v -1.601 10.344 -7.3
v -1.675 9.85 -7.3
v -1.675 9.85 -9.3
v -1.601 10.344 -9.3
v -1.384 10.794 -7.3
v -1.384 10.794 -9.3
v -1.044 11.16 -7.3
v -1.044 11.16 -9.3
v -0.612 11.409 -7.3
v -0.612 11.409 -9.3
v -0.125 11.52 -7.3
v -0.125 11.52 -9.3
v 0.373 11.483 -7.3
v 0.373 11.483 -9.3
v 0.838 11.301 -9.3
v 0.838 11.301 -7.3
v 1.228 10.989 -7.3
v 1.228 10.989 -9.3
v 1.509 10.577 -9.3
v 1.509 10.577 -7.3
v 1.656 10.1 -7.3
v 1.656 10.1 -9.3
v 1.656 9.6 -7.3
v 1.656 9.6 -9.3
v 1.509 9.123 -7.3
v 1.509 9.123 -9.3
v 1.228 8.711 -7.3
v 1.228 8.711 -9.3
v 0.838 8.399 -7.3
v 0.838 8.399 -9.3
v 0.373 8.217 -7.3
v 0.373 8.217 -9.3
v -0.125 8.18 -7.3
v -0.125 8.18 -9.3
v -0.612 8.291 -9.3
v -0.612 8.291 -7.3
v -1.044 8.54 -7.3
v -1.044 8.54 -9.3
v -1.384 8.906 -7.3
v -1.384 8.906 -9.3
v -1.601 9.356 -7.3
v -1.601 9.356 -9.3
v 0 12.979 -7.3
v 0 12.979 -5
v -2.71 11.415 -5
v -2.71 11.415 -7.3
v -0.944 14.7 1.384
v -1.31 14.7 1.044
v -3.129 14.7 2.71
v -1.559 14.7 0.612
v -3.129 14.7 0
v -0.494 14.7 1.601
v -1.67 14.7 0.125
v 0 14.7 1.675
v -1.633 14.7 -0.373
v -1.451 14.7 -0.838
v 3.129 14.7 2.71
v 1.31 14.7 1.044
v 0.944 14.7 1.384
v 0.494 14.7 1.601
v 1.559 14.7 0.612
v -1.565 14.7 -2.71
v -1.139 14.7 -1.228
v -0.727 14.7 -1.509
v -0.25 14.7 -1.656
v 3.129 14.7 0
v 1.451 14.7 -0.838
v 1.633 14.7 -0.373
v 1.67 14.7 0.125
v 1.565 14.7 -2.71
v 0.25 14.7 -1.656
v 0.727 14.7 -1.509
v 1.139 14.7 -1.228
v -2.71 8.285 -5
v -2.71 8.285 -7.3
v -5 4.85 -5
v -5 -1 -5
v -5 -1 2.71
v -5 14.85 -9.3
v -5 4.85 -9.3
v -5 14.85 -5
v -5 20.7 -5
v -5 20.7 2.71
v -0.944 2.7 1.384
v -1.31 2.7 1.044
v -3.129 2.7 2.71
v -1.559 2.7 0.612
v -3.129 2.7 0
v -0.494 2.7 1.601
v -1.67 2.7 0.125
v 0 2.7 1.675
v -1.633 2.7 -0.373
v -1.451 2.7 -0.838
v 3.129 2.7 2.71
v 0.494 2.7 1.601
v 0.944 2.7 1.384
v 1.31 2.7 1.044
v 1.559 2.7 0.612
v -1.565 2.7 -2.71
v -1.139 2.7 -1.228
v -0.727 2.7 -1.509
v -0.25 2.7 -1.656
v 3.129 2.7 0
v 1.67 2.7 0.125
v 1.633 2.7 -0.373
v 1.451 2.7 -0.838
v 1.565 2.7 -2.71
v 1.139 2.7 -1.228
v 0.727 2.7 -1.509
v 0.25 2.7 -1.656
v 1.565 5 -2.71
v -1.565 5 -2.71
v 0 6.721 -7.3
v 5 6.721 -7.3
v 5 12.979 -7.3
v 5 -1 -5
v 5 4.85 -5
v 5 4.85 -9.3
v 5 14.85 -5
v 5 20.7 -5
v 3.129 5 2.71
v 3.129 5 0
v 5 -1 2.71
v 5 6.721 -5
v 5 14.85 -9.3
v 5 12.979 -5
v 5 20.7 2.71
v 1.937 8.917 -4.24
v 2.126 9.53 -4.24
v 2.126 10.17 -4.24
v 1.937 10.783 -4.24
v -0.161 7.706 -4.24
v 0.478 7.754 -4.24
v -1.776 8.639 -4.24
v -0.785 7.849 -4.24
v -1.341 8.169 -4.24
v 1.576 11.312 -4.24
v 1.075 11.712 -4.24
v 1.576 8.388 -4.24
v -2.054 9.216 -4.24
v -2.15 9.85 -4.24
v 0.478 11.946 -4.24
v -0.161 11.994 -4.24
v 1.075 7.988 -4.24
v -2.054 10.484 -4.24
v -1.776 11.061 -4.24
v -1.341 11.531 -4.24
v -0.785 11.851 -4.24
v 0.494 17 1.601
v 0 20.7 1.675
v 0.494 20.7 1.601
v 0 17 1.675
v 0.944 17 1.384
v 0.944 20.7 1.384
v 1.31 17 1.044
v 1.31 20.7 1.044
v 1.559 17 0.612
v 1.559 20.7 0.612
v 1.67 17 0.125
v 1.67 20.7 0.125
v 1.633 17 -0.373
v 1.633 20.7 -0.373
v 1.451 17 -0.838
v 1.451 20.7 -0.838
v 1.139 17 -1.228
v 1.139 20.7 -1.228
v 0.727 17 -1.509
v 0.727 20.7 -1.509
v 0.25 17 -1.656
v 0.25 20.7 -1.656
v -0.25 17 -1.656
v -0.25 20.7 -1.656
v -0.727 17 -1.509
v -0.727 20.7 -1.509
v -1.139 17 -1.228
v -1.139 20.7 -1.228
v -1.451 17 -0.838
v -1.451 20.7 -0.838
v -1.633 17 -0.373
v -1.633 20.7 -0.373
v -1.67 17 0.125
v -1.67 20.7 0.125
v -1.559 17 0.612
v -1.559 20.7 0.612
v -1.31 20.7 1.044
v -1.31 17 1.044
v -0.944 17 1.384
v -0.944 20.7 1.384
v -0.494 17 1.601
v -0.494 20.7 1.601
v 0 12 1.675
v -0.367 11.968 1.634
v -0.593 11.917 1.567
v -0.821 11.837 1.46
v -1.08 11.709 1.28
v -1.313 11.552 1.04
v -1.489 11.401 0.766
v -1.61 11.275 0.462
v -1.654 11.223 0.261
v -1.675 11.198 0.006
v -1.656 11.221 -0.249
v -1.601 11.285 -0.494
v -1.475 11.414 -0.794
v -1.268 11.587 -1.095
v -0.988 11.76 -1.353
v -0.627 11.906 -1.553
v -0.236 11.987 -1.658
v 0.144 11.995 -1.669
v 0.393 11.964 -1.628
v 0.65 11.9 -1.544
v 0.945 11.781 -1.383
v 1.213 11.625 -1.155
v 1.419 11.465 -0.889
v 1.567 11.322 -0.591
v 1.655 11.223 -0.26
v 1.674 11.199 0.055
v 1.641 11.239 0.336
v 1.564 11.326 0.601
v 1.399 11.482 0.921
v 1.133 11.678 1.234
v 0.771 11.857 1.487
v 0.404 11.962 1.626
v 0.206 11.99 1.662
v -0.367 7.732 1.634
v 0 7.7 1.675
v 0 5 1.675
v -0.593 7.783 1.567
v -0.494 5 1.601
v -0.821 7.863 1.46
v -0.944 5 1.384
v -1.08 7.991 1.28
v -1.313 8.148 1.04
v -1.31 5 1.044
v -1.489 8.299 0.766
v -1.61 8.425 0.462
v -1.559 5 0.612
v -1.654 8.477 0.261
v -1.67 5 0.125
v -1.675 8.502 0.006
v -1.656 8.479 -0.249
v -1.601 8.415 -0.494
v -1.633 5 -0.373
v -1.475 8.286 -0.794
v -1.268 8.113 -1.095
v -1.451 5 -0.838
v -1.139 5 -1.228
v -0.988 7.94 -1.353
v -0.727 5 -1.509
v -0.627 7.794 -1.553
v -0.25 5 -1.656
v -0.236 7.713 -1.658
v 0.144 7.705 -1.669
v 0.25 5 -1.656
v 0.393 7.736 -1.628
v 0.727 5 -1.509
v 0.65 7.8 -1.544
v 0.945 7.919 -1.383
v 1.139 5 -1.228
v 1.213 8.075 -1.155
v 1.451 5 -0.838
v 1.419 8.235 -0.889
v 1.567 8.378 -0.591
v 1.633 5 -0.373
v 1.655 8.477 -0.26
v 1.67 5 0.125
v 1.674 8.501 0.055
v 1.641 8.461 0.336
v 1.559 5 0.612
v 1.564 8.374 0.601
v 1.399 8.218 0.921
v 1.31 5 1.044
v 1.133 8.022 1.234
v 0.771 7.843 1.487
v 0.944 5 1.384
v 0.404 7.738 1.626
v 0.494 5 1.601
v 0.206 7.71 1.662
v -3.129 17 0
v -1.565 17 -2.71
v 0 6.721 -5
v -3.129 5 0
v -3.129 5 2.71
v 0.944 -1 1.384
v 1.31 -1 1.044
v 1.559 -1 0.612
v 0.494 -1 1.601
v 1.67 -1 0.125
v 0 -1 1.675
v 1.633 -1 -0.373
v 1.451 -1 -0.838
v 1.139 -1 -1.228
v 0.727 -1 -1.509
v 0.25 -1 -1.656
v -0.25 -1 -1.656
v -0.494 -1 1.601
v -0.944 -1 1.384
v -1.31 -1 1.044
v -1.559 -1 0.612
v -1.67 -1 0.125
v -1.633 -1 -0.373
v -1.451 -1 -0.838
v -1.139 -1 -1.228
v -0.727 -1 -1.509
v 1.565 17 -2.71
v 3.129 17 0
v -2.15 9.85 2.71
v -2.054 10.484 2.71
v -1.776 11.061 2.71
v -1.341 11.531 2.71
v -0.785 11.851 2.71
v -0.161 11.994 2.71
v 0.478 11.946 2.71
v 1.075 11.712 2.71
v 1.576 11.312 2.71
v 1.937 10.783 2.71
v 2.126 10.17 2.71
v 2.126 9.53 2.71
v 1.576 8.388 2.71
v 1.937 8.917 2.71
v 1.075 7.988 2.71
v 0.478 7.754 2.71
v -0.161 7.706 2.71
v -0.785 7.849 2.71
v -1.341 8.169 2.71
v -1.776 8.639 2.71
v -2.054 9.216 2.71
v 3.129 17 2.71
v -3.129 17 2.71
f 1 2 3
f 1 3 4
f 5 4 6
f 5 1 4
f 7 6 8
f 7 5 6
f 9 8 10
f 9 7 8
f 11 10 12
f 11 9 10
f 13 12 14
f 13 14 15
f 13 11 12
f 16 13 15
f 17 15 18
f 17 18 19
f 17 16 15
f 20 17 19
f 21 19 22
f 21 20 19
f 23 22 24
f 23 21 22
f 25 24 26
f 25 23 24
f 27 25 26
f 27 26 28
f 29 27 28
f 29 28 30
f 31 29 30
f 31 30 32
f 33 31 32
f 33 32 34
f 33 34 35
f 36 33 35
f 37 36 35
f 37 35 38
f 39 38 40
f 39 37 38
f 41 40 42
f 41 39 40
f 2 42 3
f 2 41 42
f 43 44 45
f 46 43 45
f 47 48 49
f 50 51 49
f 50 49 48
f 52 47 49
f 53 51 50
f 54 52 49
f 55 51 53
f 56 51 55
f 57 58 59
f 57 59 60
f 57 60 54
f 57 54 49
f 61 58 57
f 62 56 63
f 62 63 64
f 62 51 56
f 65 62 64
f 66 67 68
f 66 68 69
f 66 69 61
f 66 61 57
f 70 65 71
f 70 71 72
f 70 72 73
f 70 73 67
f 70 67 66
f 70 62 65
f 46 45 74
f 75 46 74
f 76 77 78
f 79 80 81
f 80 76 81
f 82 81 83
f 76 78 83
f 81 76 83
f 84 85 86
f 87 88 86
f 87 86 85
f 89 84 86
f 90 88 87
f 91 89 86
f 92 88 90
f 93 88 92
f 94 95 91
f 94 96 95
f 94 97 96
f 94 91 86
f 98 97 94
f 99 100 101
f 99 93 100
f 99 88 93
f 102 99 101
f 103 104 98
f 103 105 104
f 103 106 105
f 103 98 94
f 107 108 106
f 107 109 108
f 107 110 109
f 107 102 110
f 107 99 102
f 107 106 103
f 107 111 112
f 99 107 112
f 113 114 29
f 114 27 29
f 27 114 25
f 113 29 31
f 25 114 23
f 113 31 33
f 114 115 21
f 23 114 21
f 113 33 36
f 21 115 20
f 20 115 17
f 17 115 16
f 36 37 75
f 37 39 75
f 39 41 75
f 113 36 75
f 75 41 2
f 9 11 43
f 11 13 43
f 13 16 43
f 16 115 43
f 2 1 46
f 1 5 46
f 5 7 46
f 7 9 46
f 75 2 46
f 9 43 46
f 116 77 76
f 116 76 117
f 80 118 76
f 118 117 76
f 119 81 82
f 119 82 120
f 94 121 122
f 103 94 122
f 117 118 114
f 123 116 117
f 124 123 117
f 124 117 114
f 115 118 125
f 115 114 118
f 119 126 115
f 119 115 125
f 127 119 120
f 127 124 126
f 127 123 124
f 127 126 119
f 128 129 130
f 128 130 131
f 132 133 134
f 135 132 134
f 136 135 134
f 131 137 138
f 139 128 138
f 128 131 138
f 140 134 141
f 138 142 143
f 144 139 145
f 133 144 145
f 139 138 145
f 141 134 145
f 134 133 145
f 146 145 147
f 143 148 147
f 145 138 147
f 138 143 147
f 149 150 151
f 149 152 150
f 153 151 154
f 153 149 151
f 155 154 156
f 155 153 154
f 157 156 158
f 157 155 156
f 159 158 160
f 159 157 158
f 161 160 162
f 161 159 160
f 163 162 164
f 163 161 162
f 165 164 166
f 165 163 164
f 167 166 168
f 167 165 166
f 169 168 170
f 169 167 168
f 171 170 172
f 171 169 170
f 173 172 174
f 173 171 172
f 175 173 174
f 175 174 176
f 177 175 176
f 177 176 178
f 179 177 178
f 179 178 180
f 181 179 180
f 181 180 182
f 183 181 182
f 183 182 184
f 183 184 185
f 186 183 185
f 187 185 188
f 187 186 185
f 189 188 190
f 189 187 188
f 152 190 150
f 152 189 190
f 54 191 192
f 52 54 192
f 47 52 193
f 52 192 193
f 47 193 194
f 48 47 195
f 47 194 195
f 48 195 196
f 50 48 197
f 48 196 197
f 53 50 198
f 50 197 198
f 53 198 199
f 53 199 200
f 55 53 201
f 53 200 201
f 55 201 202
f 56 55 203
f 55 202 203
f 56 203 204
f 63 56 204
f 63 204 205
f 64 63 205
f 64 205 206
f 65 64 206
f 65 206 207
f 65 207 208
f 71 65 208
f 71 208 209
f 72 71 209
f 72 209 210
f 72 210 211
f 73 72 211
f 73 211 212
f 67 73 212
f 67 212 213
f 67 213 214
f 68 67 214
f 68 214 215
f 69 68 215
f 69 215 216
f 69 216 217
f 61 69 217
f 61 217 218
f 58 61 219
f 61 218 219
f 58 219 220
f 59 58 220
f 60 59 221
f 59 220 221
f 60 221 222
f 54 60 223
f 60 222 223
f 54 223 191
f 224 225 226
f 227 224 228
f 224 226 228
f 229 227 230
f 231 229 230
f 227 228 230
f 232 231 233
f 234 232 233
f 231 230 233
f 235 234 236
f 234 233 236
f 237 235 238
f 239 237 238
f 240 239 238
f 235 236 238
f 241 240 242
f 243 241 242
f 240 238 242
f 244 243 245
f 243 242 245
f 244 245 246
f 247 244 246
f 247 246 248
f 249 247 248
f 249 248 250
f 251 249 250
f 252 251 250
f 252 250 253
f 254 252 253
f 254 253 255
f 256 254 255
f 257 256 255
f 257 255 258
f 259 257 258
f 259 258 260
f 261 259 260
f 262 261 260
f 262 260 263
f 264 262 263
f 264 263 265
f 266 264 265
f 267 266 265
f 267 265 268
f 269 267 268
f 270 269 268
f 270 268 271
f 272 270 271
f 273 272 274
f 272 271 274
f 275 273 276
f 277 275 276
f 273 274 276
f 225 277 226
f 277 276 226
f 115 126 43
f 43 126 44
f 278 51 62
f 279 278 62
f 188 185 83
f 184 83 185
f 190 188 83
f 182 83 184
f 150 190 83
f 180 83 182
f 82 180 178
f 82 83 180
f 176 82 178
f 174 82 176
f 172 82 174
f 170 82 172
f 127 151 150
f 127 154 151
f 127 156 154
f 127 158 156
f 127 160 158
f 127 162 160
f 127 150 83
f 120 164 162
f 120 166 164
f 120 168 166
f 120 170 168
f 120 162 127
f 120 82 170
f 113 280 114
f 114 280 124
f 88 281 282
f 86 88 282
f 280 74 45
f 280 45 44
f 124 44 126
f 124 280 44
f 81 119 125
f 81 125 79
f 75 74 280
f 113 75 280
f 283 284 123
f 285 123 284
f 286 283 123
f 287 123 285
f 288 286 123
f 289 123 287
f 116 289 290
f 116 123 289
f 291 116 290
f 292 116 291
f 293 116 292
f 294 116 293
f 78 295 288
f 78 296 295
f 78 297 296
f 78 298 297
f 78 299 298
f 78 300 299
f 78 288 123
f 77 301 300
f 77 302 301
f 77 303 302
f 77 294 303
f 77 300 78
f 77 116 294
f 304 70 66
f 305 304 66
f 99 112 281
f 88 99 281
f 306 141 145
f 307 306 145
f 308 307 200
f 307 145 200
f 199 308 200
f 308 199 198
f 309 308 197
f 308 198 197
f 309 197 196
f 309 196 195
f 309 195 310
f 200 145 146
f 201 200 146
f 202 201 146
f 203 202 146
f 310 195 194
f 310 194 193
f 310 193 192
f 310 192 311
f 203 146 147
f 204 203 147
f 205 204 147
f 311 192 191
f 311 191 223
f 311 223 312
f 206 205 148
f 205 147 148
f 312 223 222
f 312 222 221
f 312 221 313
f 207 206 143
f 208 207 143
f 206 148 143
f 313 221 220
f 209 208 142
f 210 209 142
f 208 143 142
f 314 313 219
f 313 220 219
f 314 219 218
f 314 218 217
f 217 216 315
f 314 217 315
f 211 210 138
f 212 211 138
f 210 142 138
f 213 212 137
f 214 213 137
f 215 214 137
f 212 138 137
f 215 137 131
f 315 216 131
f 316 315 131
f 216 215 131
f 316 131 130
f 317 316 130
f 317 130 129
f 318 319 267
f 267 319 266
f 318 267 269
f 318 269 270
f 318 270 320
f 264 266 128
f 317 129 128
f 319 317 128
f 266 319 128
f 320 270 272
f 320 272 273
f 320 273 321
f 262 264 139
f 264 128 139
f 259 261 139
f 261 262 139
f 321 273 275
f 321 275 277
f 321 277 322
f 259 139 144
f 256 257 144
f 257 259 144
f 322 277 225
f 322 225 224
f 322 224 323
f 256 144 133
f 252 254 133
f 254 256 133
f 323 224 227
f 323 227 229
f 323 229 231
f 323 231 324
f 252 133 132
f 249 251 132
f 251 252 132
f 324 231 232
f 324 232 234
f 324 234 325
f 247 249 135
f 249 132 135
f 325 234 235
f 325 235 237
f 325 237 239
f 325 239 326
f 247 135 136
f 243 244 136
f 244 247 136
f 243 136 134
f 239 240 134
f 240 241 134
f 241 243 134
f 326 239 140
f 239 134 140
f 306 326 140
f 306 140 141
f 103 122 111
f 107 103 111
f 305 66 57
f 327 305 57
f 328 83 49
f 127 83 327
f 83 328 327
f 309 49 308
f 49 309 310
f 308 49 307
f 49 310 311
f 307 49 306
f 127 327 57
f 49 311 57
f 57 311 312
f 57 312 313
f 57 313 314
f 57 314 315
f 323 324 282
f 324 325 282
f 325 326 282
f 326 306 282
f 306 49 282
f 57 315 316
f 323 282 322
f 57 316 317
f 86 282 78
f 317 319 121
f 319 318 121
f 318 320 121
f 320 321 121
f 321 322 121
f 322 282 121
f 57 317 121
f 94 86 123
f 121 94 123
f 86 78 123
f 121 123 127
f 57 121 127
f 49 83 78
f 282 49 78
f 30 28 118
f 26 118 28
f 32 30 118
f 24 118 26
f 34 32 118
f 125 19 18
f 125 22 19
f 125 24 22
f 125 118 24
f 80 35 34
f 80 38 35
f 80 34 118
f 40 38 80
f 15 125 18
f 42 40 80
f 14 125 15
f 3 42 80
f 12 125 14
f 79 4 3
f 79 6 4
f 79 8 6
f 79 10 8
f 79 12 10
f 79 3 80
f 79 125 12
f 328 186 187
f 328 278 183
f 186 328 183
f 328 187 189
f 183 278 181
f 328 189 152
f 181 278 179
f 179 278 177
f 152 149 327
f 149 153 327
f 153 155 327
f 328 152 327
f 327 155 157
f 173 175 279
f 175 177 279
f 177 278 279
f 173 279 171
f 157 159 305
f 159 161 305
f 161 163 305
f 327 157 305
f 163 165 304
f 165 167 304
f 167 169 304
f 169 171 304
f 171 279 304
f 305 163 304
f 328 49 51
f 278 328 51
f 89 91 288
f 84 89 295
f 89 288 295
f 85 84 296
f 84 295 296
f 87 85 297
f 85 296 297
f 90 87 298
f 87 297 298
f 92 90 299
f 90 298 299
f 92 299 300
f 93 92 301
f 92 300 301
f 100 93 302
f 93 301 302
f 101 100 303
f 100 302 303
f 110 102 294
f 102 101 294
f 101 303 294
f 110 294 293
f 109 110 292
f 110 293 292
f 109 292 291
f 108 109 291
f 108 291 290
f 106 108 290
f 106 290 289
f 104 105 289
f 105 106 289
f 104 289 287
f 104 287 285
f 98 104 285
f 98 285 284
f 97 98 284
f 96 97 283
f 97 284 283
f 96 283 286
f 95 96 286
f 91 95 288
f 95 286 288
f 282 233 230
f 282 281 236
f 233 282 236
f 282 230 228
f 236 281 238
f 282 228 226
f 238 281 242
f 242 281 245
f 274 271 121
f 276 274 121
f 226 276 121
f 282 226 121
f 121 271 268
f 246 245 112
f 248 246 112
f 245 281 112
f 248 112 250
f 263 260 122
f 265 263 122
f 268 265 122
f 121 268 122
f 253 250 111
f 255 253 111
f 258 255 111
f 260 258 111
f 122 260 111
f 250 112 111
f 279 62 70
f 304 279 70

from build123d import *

# Parameters (mm, degrees)
SKETCH1_W               = 10
SKETCH1_H               = 10
BOSS_EXTRUDE1_DEPTH     = 5
CUT_EXTRUDE1_DEPTH      = 9.660254038
CUT_EXTRUDE1_DEPTH_BACK = 9.660254038
SKETCH2_R               = 1.675
SKETCH3_R               = 1.675
CUT_EXTRUDE3_DEPTH      = 2.3
SKETCH4_W               = 10
SKETCH4_H               = 10
BOSS_EXTRUDE2_DEPTH     = 2.7
SKETCH6_W               = 10
SKETCH6_H               = 10
BOSS_EXTRUDE3_DEPTH     = 7
SKETCH9_R               = 2.15
CUT_EXTRUDE12_DEPTH     = 19.468622038
SKETCH10_R              = 1.675
CUT_EXTRUDE13_DEPTH     = 13.003749414
BOSS_EXTRUDE4_DEPTH     = 2.3
SKETCH12_W              = 10
SKETCH12_H              = 10
BOSS_EXTRUDE5_DEPTH     = 2.7
CUT_EXTRUDE14_START     = -2.7
SKETCH13_R              = 1.675
CUT_EXTRUDE14_DEPTH     = 2.7
SKETCH14_R              = 2.15
BOSS_EXTRUDE6_DEPTH     = 0.76
SKETCH16_W              = 10
SKETCH16_H              = 19.7
CUT_EXTRUDE15_DEPTH     = 2.29
BOSS_EXTRUDE7_START     = 1
SKETCH17_W              = 10
SKETCH17_H              = 7.71
SKETCH17_R              = 1.675
BOSS_EXTRUDE7_DEPTH     = 1
SKETCH18_W              = 10
SKETCH18_H              = 7.71
SKETCH18_R              = 1.675
BOSS_EXTRUDE9_DEPTH     = 1
BOSS_EXTRUDE13_DEPTH    = 2.3
SKETCH23_W              = 10
SKETCH23_H              = 10
SKETCH23_R              = 1.675
BOSS_EXTRUDE15_DEPTH    = 2


with BuildPart() as part:
    # Sketch1 → Boss-Extrude1 (new body)
    with BuildSketch(Plane(origin=(0, 0, 0), x_dir=(1, 0, 0), z_dir=(0, 1, 0))):
        Rectangle(SKETCH1_W, SKETCH1_H)
    extrude(amount=BOSS_EXTRUDE1_DEPTH)

    # Sketch2 → Cut-Extrude1 (cut, two sides: drawn at the far end of the back side and taken through both)
    with BuildSketch(Plane(origin=(0, 5, 0), x_dir=(1, 0, 0), z_dir=(0, 1, 0)).offset(-CUT_EXTRUDE1_DEPTH_BACK)):
        with Locations(Location((0, 0, 0), (0, 0, 270))):
            Circle(SKETCH2_R)
    extrude(amount=CUT_EXTRUDE1_DEPTH + CUT_EXTRUDE1_DEPTH_BACK, mode=Mode.SUBTRACT)

    # Sketch3 → Cut-Extrude3 (cut)
    # profile 1 of 2: a face of its own
    with BuildSketch(Plane(origin=(0, 5, 0), x_dir=(1, 0, 0), z_dir=(0, 1, 0))):
        Polygon((-1.56461923, -2.71), (1.56461923, -2.71), (3.129238459, 0), (1.56461923, 2.71), (-1.56461923, 2.71), (-3.129238459, 0), align=None)
        with Locations(Location((0, 0, 0), (0, 0, 270))):
            Circle(SKETCH3_R, mode=Mode.SUBTRACT)
    # profile 2 of 2: a face of its own
    with BuildSketch(Plane(origin=(0, 5, 0), x_dir=(1, 0, 0), z_dir=(0, 1, 0))):
        Polygon((-1.56461923, -2.71), (-3.129238459, 0), (-3.129238459, -5), (3.129238459, -5), (3.129238459, 0), (1.56461923, -2.71), align=None)
    extrude(amount=-CUT_EXTRUDE3_DEPTH, mode=Mode.SUBTRACT)

    # Sketch4 → Boss-Extrude2 (add)
    with BuildSketch(Plane(origin=(0, 5, 0), x_dir=(1, 0, 0), z_dir=(0, 1, 0))):
        Rectangle(SKETCH4_W, SKETCH4_H)
    extrude(amount=BOSS_EXTRUDE2_DEPTH)

    # Sketch6 → Boss-Extrude3 (add)
    with BuildSketch(Plane(origin=(0, 7.7, 0), x_dir=(1, 0, 0), z_dir=(0, 1, 0))):
        Rectangle(SKETCH6_W, SKETCH6_H)
    extrude(amount=BOSS_EXTRUDE3_DEPTH)

    # Sketch9 → Cut-Extrude12 (cut, through all)
    with BuildSketch(Plane(origin=(0, 0, -5), x_dir=(-1, 0, 0), z_dir=(0, 0, -1))):
        with Locations((0, 9.85)):
            Circle(SKETCH9_R)
    extrude(amount=-CUT_EXTRUDE12_DEPTH, mode=Mode.SUBTRACT)

    # Sketch10 → Cut-Extrude13 (cut, through all)
    with BuildSketch(Plane.XZ.offset(-5)):
        with Locations(Location((0, 0, 0), (0, 0, 90))):
            Circle(SKETCH10_R)
    extrude(amount=-CUT_EXTRUDE13_DEPTH, mode=Mode.SUBTRACT)

    # Sketch11 → Boss-Extrude4 (add)
    with BuildSketch(Plane(origin=(0, 14.7, 0), x_dir=(1, 0, 0), z_dir=(0, 1, 0))):
        Polygon((1.56461923, 2.71), (3.129238459, 0), (3.129238459, -5), (5, -5), (5, 5), (-5, 5), (-5, -5), (-3.129238459, -5), (-3.129238459, 0), (-1.56461923, 2.71), align=None)
    extrude(amount=BOSS_EXTRUDE4_DEPTH)

    # Sketch12 → Boss-Extrude5 (add)
    with BuildSketch(Plane(origin=(0, 17, 0), x_dir=(1, 0, 0), z_dir=(0, 1, 0))):
        Rectangle(SKETCH12_W, SKETCH12_H)
    extrude(amount=BOSS_EXTRUDE5_DEPTH)

    # Sketch13 → Cut-Extrude14 (cut)
    with BuildSketch(Plane(origin=(0, 19.7, 0), x_dir=(1, 0, 0), z_dir=(0, 1, 0)).offset(CUT_EXTRUDE14_START)):
        with Locations(Location((0, 0, 0), (0, 0, 270))):
            Circle(SKETCH13_R)
    extrude(amount=CUT_EXTRUDE14_DEPTH, mode=Mode.SUBTRACT)

    # Sketch16 → Cut-Extrude15 (cut)
    with BuildSketch(Plane.XY.offset(5)):
        with Locations((0, 9.85)):
            Rectangle(SKETCH16_W, SKETCH16_H)
    extrude(amount=-CUT_EXTRUDE15_DEPTH, mode=Mode.SUBTRACT)

    # Sketch17 → Boss-Extrude7 (add)
    with BuildSketch(Plane(origin=(0, 0, 0), x_dir=(-1, 0, 0), z_dir=(0, -1, 0)).offset(BOSS_EXTRUDE7_START)):
        with Locations((0, 1.145)):
            Rectangle(SKETCH17_W, SKETCH17_H)
        with Locations(Location((0, 0, 0), (0, 0, 270))):
            Circle(SKETCH17_R, mode=Mode.SUBTRACT)
    extrude(amount=-BOSS_EXTRUDE7_DEPTH)

    # Sketch18 → Boss-Extrude9 (add)
    with BuildSketch(Plane(origin=(0, 19.7, 0), x_dir=(1, 0, 0), z_dir=(0, 1, 0))):
        with Locations((0, 1.145)):
            Rectangle(SKETCH18_W, SKETCH18_H)
        with Locations(Location((0, 0, 0), (0, 0, 270))):
            Circle(SKETCH18_R, mode=Mode.SUBTRACT)
    extrude(amount=BOSS_EXTRUDE9_DEPTH)


with BuildPart() as body_2:
    # Sketch14 → Boss-Extrude6 (new body)
    with BuildSketch(Plane(origin=(0, 0, -5), x_dir=(-1, 0, 0), z_dir=(0, 0, -1))):
        with Locations((0, 9.85)):
            Circle(SKETCH14_R)
    extrude(amount=-BOSS_EXTRUDE6_DEPTH)


    add(part.part)  # Boss-Extrude13 merges part
    # Sketch22 → Boss-Extrude13 (add)
    with BuildSketch(Plane(origin=(0, 0, -5), x_dir=(-1, 0, 0), z_dir=(0, 0, -1))):
        Polygon((-5, 12.979238459), (0, 12.979238459), (2.71, 11.41461923), (2.71, 8.28538077), (0, 6.720761541), (-5, 6.720761541), (-5, 4.85), (5, 4.85), (5, 14.85), (-5, 14.85), align=None)
    extrude(amount=BOSS_EXTRUDE13_DEPTH)

    # Sketch23 → Boss-Extrude15 (add)
    with BuildSketch(Plane(origin=(0, 0, -7.3), x_dir=(-1, 0, 0), z_dir=(0, 0, -1))):
        with Locations((0, 9.85)):
            Rectangle(SKETCH23_W, SKETCH23_H)
        with Locations((0, 9.85)):
            Circle(SKETCH23_R, mode=Mode.SUBTRACT)
    extrude(amount=BOSS_EXTRUDE15_DEPTH)


solid = body_2.part
